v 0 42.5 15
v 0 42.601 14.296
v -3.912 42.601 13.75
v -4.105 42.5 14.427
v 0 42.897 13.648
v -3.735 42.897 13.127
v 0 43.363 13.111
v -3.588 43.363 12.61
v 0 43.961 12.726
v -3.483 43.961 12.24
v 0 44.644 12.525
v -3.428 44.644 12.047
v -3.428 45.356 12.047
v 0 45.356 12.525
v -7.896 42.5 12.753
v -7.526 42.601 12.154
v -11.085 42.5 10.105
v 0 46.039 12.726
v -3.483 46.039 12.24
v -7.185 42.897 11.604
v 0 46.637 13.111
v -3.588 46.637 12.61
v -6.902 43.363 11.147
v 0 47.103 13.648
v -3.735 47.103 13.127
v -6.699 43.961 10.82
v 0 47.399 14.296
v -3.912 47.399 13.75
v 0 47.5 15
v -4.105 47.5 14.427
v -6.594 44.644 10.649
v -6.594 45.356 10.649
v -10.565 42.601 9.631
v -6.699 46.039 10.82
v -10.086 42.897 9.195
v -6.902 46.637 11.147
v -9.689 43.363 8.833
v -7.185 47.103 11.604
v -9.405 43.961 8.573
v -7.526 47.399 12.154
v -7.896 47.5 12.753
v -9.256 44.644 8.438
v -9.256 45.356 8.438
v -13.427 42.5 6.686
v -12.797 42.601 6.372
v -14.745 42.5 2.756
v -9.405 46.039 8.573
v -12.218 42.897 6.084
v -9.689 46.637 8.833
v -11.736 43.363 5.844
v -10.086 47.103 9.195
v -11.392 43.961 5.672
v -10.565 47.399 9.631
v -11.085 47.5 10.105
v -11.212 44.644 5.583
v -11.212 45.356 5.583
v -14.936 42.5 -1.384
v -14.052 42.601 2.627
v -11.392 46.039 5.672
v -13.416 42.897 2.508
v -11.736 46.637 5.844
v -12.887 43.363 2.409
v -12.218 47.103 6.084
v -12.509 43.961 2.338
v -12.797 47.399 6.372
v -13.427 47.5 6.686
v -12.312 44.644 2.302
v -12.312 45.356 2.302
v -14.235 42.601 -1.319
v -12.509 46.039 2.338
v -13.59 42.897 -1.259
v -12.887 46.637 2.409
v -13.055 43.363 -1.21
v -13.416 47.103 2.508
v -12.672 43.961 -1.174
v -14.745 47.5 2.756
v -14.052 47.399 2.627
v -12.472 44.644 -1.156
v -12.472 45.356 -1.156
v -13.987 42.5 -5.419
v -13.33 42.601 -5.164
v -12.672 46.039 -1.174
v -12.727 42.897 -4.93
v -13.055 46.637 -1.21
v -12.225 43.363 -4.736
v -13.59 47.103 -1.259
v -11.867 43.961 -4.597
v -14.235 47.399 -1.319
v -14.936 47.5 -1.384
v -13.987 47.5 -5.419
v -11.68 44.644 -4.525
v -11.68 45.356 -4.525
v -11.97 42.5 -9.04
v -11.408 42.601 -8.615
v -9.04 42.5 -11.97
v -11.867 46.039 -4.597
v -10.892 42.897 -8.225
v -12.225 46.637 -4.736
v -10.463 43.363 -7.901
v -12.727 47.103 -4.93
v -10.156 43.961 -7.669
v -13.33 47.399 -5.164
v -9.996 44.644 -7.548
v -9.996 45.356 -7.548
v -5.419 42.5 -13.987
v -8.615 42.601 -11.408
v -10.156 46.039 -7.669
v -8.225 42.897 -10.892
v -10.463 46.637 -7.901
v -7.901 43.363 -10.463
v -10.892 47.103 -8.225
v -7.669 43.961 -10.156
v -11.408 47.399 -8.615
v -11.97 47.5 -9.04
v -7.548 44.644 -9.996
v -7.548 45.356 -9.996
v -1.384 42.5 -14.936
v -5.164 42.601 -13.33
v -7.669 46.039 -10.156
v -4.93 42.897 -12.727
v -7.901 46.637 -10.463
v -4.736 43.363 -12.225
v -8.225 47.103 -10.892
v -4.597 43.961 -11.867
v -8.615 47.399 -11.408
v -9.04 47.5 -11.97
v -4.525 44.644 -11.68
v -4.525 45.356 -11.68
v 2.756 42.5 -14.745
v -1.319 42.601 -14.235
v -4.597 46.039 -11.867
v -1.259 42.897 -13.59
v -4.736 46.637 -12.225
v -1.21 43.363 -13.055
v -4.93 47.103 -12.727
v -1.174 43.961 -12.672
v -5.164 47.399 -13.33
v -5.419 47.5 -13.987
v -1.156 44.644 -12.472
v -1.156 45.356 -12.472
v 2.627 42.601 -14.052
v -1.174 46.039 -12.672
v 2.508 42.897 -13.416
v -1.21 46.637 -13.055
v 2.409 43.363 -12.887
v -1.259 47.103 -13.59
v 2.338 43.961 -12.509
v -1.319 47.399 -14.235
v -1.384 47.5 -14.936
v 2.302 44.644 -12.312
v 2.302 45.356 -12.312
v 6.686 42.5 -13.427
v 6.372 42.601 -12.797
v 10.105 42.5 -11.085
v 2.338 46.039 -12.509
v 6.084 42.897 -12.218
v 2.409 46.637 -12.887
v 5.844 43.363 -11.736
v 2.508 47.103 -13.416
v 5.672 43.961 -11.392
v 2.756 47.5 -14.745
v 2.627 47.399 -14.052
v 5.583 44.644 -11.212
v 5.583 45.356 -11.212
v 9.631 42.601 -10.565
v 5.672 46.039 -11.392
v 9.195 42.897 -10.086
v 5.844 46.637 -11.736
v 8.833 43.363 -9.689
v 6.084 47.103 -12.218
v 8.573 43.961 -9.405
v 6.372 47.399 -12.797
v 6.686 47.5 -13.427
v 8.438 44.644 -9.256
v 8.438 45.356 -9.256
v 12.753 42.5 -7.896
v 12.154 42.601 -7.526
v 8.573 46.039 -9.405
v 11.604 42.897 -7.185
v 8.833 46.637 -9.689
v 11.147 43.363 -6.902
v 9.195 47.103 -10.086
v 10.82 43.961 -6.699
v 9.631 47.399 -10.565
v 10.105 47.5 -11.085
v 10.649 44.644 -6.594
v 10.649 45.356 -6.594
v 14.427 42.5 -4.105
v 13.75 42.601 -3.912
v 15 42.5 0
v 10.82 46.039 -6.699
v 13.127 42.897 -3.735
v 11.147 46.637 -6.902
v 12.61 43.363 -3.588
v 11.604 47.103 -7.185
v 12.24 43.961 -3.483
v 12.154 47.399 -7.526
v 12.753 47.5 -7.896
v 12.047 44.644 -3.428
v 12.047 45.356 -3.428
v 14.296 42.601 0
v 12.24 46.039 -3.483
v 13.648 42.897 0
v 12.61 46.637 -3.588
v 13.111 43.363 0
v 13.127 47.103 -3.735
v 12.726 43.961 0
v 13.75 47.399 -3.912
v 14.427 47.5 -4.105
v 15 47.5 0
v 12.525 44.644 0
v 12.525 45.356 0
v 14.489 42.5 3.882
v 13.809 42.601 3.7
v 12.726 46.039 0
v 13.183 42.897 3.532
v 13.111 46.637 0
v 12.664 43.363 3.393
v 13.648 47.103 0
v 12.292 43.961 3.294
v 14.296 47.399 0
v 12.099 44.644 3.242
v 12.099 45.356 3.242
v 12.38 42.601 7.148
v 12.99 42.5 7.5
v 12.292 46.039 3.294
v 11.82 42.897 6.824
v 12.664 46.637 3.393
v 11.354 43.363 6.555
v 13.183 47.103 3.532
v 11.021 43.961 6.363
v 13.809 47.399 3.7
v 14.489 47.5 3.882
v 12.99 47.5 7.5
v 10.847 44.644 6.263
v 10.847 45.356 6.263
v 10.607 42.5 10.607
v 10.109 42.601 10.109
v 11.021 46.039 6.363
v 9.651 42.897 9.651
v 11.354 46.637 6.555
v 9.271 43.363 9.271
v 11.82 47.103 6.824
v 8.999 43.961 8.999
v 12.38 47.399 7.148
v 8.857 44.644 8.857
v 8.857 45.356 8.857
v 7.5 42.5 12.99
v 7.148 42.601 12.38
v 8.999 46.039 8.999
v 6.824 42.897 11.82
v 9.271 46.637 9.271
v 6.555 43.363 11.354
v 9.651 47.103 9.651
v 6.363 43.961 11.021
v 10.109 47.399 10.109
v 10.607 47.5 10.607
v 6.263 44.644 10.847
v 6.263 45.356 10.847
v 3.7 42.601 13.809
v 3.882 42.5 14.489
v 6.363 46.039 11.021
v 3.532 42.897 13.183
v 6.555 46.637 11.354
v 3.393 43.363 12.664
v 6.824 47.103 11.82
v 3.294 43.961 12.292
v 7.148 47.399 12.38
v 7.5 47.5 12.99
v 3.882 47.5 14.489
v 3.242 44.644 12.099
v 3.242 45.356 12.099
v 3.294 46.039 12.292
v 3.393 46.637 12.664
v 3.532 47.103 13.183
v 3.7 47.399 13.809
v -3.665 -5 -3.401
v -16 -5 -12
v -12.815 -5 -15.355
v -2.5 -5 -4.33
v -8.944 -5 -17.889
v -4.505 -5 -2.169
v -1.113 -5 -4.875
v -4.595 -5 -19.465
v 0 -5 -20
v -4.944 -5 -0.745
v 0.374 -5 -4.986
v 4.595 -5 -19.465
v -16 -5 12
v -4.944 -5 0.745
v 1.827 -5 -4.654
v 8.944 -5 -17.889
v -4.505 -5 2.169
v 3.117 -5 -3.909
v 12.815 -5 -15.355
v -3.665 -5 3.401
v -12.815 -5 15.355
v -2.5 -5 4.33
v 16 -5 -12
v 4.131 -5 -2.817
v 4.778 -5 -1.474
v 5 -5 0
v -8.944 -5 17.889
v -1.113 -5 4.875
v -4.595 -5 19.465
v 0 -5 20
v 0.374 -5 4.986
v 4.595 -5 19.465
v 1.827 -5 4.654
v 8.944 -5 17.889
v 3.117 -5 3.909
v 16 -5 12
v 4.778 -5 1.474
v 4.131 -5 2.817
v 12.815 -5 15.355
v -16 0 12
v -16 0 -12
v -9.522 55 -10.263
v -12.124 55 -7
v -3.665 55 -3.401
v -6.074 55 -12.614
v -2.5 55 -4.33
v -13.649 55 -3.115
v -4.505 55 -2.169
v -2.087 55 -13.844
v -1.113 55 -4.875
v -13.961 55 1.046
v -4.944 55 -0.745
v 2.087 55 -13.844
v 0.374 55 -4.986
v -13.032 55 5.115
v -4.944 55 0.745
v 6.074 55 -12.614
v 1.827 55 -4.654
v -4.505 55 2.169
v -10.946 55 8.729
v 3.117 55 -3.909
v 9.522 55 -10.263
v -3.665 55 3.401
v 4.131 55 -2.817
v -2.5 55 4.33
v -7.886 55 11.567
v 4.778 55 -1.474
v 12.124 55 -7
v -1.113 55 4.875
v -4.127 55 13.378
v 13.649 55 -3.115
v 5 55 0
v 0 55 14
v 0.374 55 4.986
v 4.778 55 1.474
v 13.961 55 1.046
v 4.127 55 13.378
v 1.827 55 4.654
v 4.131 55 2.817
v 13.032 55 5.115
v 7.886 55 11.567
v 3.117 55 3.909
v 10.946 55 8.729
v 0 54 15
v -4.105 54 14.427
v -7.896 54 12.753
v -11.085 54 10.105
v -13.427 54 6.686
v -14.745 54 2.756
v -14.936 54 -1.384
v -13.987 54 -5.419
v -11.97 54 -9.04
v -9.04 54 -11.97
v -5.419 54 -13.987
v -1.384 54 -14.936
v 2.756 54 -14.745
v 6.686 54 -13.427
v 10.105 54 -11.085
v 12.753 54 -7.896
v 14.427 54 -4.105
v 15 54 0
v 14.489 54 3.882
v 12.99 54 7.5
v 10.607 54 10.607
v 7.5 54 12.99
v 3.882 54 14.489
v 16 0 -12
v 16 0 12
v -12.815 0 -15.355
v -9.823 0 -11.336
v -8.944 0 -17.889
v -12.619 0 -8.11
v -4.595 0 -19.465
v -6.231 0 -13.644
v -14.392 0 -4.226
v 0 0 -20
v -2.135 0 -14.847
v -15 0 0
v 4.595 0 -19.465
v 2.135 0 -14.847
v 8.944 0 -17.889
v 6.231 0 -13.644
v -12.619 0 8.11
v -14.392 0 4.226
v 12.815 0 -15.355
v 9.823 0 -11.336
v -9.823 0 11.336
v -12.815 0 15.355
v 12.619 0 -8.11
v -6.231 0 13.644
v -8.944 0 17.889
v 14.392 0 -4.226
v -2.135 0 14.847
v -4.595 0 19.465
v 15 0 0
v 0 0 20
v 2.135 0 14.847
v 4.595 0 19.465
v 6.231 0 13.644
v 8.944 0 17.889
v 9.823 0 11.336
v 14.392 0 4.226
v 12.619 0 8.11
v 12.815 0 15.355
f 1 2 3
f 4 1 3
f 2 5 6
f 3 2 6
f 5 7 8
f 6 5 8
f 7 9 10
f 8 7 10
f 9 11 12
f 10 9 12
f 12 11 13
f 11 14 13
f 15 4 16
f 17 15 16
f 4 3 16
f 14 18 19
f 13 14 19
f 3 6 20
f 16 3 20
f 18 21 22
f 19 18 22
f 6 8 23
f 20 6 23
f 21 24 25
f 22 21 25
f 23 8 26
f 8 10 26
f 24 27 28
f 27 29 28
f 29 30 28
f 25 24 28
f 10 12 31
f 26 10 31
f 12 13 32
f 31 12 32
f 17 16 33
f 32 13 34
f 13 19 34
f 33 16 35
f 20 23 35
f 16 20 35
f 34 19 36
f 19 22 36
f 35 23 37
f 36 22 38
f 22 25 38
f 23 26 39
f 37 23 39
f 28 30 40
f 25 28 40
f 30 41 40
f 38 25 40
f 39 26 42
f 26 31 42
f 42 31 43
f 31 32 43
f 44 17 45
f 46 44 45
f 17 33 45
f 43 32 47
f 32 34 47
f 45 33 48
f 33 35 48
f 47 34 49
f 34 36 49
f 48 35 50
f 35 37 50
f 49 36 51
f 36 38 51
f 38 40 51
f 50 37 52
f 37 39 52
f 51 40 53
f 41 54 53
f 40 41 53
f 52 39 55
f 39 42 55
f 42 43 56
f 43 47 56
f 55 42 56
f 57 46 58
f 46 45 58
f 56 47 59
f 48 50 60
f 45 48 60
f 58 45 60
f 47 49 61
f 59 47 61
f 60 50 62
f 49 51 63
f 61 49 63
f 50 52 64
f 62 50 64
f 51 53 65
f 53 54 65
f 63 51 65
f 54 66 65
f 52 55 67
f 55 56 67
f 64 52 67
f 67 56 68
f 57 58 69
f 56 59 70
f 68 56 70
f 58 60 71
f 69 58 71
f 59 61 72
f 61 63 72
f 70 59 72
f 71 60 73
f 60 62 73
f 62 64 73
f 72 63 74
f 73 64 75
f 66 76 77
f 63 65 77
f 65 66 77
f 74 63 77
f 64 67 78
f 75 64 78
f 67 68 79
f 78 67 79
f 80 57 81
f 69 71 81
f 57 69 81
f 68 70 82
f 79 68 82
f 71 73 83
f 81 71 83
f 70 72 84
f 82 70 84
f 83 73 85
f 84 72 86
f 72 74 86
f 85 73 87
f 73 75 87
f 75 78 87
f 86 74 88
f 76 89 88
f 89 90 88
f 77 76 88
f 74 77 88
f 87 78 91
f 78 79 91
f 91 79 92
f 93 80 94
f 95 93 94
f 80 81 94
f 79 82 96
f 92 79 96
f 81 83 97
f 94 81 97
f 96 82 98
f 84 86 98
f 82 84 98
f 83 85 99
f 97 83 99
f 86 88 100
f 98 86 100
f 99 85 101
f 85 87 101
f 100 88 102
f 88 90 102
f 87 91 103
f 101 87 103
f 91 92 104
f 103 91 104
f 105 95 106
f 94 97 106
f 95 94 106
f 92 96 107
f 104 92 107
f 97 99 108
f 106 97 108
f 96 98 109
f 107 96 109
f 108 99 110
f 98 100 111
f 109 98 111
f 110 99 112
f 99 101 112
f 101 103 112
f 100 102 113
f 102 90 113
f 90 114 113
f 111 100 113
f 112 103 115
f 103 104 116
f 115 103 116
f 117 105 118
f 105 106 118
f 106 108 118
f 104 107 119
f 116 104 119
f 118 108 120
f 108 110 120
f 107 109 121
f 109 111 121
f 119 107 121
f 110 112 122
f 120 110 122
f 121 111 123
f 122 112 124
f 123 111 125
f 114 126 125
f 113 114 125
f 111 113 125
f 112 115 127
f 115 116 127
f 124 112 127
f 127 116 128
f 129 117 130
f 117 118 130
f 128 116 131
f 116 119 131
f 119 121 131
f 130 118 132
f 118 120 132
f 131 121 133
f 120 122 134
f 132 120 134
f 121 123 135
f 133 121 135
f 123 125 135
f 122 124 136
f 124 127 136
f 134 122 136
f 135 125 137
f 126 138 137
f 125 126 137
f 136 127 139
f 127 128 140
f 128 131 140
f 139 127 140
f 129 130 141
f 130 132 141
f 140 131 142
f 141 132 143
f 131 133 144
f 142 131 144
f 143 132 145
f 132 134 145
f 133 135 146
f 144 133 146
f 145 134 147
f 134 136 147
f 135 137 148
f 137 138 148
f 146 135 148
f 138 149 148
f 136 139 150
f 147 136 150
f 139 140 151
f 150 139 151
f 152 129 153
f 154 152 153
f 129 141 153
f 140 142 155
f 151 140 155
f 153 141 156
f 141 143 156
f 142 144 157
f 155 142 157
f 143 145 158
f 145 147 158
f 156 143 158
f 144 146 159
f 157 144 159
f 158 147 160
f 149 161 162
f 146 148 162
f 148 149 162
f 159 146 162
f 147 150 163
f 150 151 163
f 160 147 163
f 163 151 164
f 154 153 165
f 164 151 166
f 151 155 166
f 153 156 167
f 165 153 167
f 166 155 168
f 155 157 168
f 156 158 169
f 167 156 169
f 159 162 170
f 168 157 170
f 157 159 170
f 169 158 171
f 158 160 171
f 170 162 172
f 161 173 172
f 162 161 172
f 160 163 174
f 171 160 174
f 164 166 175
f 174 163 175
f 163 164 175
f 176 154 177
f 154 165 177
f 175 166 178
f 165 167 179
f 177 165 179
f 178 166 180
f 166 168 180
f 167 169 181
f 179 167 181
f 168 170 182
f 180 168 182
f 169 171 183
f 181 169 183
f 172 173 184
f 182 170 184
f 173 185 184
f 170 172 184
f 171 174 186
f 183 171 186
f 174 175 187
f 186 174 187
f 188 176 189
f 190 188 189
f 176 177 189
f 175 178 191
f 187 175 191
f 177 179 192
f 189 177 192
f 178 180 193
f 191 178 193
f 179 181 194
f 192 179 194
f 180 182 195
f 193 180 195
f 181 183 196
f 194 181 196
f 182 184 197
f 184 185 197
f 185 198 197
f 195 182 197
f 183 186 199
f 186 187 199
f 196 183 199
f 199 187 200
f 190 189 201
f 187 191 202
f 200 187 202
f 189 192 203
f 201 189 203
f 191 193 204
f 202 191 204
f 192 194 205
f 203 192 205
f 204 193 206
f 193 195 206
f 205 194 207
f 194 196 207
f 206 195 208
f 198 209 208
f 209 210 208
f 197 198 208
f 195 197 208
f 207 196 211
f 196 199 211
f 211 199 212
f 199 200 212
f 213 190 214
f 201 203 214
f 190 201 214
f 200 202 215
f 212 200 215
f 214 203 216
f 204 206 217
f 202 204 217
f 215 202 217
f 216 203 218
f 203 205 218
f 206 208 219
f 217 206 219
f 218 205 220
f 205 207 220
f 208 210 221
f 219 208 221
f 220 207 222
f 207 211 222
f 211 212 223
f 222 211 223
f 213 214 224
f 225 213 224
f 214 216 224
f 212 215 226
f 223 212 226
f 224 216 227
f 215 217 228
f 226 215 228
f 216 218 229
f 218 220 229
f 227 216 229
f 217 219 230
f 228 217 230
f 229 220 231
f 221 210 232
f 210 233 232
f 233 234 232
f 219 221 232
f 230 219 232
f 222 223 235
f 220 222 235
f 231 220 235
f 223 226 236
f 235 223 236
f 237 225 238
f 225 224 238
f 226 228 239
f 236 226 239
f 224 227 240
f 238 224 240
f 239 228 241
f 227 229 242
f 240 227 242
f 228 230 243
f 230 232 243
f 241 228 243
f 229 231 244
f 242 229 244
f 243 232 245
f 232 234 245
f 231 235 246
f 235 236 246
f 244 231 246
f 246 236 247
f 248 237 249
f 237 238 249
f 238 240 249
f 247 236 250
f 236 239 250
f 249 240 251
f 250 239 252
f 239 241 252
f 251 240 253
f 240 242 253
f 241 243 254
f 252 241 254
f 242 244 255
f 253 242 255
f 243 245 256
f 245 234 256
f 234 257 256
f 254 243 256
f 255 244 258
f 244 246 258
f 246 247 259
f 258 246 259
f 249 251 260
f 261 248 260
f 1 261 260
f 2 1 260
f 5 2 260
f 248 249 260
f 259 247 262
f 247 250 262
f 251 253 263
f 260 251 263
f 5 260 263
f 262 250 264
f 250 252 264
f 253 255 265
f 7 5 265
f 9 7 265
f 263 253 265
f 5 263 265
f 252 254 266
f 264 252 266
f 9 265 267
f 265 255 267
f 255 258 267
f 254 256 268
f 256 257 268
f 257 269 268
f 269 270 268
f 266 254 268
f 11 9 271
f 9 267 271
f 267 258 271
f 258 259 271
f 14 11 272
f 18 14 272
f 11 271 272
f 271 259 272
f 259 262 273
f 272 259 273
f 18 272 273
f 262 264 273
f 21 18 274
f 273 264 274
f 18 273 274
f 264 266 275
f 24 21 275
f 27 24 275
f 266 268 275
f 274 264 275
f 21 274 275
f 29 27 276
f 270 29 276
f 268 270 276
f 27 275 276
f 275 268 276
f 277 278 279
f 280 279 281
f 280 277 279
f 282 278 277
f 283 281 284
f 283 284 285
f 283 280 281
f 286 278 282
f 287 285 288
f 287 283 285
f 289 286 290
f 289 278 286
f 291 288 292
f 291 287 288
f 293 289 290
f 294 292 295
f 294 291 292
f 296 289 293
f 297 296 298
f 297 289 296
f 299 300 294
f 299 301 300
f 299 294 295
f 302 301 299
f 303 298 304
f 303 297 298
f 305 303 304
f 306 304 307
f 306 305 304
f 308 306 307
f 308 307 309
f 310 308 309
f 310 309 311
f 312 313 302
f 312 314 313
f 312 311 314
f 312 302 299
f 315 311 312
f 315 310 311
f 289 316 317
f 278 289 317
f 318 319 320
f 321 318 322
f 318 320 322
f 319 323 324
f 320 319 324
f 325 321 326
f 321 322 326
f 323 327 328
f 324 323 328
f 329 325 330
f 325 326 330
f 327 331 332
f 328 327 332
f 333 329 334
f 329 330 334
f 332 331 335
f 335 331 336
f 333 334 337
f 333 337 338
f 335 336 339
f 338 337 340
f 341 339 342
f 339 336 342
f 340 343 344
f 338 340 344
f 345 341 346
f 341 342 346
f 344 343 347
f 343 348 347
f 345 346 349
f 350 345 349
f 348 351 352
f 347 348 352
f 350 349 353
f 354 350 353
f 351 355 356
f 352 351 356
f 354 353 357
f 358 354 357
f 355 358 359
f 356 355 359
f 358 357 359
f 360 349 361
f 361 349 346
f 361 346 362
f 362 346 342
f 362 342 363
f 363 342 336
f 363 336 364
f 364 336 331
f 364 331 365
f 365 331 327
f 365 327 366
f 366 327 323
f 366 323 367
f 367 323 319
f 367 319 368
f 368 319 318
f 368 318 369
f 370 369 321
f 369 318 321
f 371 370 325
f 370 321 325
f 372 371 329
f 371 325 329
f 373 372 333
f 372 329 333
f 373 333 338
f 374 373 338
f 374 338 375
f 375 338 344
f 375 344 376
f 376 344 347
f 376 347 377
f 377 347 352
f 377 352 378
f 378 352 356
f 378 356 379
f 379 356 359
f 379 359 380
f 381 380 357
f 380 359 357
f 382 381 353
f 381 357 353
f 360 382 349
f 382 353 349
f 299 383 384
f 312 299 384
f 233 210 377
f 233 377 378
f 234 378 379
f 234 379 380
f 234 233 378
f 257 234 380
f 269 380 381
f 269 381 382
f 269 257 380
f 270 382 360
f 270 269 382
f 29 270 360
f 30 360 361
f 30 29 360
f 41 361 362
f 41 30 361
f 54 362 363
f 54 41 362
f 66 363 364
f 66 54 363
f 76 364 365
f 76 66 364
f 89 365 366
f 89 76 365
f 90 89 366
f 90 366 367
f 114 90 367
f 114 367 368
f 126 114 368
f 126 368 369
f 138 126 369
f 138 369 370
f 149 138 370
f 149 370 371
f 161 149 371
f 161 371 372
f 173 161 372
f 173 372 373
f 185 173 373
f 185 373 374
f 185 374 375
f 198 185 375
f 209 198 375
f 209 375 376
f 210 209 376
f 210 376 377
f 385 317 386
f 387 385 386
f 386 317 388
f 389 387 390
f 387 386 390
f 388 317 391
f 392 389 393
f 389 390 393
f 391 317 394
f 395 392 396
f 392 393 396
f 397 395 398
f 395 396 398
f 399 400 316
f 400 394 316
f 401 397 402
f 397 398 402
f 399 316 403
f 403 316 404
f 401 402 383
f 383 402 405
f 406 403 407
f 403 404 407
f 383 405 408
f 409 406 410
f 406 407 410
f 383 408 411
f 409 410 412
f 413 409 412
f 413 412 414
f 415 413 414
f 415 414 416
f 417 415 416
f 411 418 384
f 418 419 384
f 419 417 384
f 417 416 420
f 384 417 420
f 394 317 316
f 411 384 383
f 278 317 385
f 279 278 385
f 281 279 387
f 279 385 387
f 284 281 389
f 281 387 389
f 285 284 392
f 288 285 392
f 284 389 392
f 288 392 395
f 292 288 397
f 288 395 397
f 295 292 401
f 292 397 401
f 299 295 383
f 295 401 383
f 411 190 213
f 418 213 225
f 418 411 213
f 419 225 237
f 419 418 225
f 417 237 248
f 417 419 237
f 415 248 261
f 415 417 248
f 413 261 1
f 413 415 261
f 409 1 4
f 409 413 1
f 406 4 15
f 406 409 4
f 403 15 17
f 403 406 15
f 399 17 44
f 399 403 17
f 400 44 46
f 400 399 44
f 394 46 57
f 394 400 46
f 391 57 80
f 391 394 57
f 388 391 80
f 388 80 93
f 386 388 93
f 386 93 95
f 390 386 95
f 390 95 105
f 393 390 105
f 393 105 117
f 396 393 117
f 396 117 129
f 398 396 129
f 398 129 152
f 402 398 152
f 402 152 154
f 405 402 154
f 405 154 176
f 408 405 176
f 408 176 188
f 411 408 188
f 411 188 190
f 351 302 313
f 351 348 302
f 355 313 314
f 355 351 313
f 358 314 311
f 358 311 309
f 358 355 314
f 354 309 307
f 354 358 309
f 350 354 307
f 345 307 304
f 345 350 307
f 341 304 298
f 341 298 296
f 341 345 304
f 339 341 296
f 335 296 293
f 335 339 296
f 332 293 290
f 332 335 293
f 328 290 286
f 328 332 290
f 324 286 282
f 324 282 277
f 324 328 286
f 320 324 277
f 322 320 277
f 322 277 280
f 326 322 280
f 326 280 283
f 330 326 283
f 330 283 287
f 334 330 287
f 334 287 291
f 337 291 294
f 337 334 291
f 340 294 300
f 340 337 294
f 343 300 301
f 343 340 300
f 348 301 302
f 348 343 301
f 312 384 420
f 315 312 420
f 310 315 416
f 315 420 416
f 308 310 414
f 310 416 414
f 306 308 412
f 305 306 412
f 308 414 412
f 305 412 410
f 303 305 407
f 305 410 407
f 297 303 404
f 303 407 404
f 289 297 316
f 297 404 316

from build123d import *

# Parameters (mm, degrees)
F1_DEPTH = 5
F2_R     = 15
F3_DEPTH = 55
F4_R     = 5
F5_DEPTH = 55
F6_DEPTH = 5


with BuildPart() as f1:
    # F0 (on Front) → F1 (new body)
    with BuildSketch(Plane.XZ):
        with BuildLine():
            Line((16, 0), (16, 12))
            ThreePointArc((16, 12), (0, 20), (-16, 12))
            Line((-16, 12), (-16, 0))
            Line((-16, 0), (0, 0))
            Line((0, 0), (16, 0))
        make_face()
        with BuildLine():
            ThreePointArc((-16, -12), (0, -20), (16, -12))
            Line((16, -12), (16, 0))
            Line((16, 0), (0, 0))
            Line((0, 0), (-16, 0))
            Line((-16, 0), (-16, -12))
        make_face()
    extrude(amount=F1_DEPTH)

    # F2 (on face) → F3 (join)
    with BuildSketch(Plane.XZ):
        Circle(F2_R)
    extrude(amount=-F3_DEPTH)

    # F4 (on Front) → F5 (cut, through all)
    with BuildSketch(Plane.XZ):
        Circle(F4_R)
    extrude(amount=-F5_DEPTH, mode=Mode.SUBTRACT)

    # F4 (on Front) → F6 (cut, through all)
    with BuildSketch(Plane.XZ):
        Circle(F4_R)
    extrude(amount=F6_DEPTH, mode=Mode.SUBTRACT)

    # F7 (on Right) → F8 (revolve, cut)
    with BuildSketch(Plane.YZ):
        with BuildLine():
            Line((45, 15), (42.5, 15))
            ThreePointArc((42.5, 15), (45, 12.5), (47.5, 15))
            Line((47.5, 15), (45, 15))
        make_face()
    revolve(axis=Axis((0, 0, 0), (0, -1, 0)), mode=Mode.SUBTRACT)

    # F7 (on Right) → F9 (revolve, cut)
    with BuildSketch(Plane.YZ):
        Polygon((54, 15), (55, 14), (55, 15), align=None)
    revolve(axis=Axis((0, 0, 0), (0, -1, 0)), mode=Mode.SUBTRACT)


solid = f1.part
